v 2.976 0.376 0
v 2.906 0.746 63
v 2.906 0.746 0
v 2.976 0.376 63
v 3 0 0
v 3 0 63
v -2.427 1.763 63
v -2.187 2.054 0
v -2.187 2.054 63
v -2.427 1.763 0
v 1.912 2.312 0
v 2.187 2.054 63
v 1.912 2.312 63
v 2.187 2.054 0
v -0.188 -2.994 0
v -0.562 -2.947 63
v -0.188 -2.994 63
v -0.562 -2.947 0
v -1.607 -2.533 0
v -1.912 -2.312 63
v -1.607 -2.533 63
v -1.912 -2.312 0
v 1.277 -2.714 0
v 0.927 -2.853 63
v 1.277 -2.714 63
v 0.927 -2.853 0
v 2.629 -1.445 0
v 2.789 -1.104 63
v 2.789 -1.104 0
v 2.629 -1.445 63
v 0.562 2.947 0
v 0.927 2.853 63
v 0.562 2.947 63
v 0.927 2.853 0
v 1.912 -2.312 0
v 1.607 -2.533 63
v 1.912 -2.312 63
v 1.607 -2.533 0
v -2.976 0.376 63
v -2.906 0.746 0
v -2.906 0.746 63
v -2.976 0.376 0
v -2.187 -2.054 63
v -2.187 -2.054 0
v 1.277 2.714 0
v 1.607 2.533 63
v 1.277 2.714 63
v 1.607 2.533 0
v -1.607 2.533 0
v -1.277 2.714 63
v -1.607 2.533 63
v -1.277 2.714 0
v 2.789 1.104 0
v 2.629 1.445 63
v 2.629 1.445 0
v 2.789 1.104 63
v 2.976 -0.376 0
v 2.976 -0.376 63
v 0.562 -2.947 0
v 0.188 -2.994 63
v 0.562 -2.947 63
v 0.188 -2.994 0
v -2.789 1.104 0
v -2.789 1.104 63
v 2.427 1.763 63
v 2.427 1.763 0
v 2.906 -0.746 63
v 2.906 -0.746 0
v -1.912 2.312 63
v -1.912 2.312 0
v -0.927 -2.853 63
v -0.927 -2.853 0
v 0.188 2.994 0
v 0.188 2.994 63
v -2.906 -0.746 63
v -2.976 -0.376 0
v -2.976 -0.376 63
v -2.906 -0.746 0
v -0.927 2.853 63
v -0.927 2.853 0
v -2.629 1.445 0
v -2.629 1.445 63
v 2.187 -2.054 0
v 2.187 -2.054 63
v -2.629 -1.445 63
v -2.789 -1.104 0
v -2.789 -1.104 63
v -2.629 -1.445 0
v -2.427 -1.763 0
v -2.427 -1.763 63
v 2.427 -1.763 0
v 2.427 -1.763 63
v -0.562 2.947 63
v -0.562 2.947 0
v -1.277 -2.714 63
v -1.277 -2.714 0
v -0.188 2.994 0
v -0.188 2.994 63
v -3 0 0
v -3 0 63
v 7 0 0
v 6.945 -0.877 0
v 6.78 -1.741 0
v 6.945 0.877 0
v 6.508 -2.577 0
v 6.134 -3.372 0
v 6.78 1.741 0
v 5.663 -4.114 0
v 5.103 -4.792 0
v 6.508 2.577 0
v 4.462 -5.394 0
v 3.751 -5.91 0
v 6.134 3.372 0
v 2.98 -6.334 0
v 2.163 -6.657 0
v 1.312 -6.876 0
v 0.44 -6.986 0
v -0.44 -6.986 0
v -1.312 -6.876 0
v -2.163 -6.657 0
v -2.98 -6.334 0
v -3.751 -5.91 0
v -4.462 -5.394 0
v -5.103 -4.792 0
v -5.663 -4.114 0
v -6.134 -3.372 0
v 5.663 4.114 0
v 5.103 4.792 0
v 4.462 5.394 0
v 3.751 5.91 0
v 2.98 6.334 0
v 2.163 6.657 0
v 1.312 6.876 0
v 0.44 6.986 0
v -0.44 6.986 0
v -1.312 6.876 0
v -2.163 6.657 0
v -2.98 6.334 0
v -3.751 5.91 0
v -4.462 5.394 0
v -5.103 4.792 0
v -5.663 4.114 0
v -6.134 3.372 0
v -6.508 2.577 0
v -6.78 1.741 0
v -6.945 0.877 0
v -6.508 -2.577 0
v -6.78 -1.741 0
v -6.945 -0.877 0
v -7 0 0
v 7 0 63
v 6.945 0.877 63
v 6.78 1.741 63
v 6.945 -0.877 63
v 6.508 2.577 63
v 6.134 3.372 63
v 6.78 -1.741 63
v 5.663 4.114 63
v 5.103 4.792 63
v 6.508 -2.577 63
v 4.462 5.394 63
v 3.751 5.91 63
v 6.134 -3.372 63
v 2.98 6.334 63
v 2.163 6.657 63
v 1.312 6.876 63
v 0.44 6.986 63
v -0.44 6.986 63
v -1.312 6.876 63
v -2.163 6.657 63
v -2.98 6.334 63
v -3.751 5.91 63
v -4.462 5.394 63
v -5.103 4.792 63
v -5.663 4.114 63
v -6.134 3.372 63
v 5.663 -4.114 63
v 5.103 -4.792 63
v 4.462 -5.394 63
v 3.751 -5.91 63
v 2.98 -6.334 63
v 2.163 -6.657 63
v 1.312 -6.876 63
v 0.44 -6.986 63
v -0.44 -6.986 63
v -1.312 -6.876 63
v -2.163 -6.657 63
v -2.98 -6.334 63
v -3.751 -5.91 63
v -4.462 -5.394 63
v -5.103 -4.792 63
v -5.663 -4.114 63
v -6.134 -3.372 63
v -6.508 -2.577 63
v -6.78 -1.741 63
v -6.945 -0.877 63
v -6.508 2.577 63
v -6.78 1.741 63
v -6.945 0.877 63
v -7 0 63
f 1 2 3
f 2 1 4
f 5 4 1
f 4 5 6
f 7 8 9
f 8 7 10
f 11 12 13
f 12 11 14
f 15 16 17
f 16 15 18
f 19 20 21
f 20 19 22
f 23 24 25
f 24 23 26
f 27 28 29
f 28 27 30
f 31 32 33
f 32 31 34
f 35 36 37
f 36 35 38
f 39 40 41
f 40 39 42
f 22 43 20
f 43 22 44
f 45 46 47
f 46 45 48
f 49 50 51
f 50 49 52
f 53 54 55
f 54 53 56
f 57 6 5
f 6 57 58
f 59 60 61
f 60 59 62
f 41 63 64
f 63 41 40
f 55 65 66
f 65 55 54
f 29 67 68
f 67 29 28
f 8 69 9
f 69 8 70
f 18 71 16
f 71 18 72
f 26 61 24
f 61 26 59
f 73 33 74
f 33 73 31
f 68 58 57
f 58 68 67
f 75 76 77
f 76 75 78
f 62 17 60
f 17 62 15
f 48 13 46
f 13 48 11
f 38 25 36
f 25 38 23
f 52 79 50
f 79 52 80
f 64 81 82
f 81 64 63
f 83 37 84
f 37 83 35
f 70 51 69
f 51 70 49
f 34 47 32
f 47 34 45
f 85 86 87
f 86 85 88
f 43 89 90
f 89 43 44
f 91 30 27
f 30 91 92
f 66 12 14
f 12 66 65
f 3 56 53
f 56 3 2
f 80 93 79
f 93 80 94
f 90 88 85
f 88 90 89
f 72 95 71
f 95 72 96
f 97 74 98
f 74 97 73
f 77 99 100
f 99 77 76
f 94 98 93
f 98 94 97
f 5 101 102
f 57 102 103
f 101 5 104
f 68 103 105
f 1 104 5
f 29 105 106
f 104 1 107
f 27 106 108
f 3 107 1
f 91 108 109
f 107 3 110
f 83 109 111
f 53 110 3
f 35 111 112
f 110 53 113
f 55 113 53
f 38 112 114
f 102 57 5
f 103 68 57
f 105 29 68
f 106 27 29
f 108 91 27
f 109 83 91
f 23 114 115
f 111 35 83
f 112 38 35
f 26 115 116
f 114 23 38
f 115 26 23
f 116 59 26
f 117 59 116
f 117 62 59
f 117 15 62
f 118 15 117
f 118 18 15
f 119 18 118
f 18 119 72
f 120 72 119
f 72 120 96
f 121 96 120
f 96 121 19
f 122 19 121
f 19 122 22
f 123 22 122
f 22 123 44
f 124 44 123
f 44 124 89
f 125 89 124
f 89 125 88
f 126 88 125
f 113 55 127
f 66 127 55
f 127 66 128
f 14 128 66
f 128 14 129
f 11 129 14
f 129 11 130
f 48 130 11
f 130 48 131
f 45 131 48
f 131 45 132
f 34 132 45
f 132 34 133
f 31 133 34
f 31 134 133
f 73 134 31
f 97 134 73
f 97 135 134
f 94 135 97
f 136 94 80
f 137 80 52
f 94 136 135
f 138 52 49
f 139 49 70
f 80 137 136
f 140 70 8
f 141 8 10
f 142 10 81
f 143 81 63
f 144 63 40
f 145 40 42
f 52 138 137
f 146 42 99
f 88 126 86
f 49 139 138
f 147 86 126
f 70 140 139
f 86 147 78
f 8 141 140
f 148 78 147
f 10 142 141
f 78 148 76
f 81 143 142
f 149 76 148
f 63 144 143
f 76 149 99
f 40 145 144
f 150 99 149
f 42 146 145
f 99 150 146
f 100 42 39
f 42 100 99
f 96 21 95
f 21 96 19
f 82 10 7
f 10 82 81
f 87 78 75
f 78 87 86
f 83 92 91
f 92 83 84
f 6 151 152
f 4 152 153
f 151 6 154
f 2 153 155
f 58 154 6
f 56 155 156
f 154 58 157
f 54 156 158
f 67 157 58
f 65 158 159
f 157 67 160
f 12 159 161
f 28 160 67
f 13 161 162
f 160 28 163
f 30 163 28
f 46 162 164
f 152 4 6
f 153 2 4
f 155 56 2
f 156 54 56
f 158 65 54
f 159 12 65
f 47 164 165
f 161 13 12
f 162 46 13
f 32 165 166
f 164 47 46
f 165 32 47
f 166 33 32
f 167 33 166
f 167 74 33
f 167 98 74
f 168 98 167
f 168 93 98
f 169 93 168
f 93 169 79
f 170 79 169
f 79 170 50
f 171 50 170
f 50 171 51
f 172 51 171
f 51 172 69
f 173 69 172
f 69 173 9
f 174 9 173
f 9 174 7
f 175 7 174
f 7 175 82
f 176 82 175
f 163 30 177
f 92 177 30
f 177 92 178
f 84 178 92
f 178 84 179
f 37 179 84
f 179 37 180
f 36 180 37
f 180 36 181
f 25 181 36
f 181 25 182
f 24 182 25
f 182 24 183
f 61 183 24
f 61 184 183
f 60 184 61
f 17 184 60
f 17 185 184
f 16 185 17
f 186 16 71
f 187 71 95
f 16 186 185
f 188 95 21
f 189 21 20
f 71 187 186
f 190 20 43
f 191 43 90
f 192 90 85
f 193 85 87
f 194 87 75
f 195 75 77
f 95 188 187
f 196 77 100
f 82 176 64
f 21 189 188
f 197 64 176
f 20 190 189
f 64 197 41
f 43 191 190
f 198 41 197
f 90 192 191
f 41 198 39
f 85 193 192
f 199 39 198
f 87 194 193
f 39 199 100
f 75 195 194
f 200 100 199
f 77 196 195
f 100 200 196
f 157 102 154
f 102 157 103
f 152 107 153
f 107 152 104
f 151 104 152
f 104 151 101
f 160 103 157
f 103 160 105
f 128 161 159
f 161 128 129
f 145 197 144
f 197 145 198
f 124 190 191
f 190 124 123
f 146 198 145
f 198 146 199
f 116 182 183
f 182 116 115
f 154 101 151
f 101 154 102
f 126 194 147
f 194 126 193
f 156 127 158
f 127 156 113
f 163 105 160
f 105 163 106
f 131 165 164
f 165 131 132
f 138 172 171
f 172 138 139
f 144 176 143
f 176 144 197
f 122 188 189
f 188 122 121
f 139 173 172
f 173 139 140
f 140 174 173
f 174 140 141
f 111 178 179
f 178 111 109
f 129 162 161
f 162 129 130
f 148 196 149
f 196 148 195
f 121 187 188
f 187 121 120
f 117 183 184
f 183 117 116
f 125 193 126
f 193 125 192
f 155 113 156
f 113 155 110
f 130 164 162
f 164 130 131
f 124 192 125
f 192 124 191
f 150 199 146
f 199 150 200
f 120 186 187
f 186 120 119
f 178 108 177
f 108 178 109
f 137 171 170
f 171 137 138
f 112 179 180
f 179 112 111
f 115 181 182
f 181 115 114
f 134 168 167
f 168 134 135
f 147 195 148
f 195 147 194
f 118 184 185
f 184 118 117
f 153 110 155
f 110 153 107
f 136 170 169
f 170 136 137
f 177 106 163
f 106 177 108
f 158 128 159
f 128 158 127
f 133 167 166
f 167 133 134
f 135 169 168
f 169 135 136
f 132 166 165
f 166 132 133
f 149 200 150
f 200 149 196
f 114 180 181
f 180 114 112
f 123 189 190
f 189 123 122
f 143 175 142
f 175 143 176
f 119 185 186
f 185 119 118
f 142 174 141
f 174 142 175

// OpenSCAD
$fn = 50;


difference() {
	union() {
		cylinder(h = 63, r = 7.0000000000);
	}
	union() {
		cylinder(h = 63, r = 3.0000000000);
		cylinder(h = 63, r = 1.5000000000);
		cylinder(h = 63, r = 1.5000000000);
		cylinder(h = 63, r = 1.5000000000);
	}
}
